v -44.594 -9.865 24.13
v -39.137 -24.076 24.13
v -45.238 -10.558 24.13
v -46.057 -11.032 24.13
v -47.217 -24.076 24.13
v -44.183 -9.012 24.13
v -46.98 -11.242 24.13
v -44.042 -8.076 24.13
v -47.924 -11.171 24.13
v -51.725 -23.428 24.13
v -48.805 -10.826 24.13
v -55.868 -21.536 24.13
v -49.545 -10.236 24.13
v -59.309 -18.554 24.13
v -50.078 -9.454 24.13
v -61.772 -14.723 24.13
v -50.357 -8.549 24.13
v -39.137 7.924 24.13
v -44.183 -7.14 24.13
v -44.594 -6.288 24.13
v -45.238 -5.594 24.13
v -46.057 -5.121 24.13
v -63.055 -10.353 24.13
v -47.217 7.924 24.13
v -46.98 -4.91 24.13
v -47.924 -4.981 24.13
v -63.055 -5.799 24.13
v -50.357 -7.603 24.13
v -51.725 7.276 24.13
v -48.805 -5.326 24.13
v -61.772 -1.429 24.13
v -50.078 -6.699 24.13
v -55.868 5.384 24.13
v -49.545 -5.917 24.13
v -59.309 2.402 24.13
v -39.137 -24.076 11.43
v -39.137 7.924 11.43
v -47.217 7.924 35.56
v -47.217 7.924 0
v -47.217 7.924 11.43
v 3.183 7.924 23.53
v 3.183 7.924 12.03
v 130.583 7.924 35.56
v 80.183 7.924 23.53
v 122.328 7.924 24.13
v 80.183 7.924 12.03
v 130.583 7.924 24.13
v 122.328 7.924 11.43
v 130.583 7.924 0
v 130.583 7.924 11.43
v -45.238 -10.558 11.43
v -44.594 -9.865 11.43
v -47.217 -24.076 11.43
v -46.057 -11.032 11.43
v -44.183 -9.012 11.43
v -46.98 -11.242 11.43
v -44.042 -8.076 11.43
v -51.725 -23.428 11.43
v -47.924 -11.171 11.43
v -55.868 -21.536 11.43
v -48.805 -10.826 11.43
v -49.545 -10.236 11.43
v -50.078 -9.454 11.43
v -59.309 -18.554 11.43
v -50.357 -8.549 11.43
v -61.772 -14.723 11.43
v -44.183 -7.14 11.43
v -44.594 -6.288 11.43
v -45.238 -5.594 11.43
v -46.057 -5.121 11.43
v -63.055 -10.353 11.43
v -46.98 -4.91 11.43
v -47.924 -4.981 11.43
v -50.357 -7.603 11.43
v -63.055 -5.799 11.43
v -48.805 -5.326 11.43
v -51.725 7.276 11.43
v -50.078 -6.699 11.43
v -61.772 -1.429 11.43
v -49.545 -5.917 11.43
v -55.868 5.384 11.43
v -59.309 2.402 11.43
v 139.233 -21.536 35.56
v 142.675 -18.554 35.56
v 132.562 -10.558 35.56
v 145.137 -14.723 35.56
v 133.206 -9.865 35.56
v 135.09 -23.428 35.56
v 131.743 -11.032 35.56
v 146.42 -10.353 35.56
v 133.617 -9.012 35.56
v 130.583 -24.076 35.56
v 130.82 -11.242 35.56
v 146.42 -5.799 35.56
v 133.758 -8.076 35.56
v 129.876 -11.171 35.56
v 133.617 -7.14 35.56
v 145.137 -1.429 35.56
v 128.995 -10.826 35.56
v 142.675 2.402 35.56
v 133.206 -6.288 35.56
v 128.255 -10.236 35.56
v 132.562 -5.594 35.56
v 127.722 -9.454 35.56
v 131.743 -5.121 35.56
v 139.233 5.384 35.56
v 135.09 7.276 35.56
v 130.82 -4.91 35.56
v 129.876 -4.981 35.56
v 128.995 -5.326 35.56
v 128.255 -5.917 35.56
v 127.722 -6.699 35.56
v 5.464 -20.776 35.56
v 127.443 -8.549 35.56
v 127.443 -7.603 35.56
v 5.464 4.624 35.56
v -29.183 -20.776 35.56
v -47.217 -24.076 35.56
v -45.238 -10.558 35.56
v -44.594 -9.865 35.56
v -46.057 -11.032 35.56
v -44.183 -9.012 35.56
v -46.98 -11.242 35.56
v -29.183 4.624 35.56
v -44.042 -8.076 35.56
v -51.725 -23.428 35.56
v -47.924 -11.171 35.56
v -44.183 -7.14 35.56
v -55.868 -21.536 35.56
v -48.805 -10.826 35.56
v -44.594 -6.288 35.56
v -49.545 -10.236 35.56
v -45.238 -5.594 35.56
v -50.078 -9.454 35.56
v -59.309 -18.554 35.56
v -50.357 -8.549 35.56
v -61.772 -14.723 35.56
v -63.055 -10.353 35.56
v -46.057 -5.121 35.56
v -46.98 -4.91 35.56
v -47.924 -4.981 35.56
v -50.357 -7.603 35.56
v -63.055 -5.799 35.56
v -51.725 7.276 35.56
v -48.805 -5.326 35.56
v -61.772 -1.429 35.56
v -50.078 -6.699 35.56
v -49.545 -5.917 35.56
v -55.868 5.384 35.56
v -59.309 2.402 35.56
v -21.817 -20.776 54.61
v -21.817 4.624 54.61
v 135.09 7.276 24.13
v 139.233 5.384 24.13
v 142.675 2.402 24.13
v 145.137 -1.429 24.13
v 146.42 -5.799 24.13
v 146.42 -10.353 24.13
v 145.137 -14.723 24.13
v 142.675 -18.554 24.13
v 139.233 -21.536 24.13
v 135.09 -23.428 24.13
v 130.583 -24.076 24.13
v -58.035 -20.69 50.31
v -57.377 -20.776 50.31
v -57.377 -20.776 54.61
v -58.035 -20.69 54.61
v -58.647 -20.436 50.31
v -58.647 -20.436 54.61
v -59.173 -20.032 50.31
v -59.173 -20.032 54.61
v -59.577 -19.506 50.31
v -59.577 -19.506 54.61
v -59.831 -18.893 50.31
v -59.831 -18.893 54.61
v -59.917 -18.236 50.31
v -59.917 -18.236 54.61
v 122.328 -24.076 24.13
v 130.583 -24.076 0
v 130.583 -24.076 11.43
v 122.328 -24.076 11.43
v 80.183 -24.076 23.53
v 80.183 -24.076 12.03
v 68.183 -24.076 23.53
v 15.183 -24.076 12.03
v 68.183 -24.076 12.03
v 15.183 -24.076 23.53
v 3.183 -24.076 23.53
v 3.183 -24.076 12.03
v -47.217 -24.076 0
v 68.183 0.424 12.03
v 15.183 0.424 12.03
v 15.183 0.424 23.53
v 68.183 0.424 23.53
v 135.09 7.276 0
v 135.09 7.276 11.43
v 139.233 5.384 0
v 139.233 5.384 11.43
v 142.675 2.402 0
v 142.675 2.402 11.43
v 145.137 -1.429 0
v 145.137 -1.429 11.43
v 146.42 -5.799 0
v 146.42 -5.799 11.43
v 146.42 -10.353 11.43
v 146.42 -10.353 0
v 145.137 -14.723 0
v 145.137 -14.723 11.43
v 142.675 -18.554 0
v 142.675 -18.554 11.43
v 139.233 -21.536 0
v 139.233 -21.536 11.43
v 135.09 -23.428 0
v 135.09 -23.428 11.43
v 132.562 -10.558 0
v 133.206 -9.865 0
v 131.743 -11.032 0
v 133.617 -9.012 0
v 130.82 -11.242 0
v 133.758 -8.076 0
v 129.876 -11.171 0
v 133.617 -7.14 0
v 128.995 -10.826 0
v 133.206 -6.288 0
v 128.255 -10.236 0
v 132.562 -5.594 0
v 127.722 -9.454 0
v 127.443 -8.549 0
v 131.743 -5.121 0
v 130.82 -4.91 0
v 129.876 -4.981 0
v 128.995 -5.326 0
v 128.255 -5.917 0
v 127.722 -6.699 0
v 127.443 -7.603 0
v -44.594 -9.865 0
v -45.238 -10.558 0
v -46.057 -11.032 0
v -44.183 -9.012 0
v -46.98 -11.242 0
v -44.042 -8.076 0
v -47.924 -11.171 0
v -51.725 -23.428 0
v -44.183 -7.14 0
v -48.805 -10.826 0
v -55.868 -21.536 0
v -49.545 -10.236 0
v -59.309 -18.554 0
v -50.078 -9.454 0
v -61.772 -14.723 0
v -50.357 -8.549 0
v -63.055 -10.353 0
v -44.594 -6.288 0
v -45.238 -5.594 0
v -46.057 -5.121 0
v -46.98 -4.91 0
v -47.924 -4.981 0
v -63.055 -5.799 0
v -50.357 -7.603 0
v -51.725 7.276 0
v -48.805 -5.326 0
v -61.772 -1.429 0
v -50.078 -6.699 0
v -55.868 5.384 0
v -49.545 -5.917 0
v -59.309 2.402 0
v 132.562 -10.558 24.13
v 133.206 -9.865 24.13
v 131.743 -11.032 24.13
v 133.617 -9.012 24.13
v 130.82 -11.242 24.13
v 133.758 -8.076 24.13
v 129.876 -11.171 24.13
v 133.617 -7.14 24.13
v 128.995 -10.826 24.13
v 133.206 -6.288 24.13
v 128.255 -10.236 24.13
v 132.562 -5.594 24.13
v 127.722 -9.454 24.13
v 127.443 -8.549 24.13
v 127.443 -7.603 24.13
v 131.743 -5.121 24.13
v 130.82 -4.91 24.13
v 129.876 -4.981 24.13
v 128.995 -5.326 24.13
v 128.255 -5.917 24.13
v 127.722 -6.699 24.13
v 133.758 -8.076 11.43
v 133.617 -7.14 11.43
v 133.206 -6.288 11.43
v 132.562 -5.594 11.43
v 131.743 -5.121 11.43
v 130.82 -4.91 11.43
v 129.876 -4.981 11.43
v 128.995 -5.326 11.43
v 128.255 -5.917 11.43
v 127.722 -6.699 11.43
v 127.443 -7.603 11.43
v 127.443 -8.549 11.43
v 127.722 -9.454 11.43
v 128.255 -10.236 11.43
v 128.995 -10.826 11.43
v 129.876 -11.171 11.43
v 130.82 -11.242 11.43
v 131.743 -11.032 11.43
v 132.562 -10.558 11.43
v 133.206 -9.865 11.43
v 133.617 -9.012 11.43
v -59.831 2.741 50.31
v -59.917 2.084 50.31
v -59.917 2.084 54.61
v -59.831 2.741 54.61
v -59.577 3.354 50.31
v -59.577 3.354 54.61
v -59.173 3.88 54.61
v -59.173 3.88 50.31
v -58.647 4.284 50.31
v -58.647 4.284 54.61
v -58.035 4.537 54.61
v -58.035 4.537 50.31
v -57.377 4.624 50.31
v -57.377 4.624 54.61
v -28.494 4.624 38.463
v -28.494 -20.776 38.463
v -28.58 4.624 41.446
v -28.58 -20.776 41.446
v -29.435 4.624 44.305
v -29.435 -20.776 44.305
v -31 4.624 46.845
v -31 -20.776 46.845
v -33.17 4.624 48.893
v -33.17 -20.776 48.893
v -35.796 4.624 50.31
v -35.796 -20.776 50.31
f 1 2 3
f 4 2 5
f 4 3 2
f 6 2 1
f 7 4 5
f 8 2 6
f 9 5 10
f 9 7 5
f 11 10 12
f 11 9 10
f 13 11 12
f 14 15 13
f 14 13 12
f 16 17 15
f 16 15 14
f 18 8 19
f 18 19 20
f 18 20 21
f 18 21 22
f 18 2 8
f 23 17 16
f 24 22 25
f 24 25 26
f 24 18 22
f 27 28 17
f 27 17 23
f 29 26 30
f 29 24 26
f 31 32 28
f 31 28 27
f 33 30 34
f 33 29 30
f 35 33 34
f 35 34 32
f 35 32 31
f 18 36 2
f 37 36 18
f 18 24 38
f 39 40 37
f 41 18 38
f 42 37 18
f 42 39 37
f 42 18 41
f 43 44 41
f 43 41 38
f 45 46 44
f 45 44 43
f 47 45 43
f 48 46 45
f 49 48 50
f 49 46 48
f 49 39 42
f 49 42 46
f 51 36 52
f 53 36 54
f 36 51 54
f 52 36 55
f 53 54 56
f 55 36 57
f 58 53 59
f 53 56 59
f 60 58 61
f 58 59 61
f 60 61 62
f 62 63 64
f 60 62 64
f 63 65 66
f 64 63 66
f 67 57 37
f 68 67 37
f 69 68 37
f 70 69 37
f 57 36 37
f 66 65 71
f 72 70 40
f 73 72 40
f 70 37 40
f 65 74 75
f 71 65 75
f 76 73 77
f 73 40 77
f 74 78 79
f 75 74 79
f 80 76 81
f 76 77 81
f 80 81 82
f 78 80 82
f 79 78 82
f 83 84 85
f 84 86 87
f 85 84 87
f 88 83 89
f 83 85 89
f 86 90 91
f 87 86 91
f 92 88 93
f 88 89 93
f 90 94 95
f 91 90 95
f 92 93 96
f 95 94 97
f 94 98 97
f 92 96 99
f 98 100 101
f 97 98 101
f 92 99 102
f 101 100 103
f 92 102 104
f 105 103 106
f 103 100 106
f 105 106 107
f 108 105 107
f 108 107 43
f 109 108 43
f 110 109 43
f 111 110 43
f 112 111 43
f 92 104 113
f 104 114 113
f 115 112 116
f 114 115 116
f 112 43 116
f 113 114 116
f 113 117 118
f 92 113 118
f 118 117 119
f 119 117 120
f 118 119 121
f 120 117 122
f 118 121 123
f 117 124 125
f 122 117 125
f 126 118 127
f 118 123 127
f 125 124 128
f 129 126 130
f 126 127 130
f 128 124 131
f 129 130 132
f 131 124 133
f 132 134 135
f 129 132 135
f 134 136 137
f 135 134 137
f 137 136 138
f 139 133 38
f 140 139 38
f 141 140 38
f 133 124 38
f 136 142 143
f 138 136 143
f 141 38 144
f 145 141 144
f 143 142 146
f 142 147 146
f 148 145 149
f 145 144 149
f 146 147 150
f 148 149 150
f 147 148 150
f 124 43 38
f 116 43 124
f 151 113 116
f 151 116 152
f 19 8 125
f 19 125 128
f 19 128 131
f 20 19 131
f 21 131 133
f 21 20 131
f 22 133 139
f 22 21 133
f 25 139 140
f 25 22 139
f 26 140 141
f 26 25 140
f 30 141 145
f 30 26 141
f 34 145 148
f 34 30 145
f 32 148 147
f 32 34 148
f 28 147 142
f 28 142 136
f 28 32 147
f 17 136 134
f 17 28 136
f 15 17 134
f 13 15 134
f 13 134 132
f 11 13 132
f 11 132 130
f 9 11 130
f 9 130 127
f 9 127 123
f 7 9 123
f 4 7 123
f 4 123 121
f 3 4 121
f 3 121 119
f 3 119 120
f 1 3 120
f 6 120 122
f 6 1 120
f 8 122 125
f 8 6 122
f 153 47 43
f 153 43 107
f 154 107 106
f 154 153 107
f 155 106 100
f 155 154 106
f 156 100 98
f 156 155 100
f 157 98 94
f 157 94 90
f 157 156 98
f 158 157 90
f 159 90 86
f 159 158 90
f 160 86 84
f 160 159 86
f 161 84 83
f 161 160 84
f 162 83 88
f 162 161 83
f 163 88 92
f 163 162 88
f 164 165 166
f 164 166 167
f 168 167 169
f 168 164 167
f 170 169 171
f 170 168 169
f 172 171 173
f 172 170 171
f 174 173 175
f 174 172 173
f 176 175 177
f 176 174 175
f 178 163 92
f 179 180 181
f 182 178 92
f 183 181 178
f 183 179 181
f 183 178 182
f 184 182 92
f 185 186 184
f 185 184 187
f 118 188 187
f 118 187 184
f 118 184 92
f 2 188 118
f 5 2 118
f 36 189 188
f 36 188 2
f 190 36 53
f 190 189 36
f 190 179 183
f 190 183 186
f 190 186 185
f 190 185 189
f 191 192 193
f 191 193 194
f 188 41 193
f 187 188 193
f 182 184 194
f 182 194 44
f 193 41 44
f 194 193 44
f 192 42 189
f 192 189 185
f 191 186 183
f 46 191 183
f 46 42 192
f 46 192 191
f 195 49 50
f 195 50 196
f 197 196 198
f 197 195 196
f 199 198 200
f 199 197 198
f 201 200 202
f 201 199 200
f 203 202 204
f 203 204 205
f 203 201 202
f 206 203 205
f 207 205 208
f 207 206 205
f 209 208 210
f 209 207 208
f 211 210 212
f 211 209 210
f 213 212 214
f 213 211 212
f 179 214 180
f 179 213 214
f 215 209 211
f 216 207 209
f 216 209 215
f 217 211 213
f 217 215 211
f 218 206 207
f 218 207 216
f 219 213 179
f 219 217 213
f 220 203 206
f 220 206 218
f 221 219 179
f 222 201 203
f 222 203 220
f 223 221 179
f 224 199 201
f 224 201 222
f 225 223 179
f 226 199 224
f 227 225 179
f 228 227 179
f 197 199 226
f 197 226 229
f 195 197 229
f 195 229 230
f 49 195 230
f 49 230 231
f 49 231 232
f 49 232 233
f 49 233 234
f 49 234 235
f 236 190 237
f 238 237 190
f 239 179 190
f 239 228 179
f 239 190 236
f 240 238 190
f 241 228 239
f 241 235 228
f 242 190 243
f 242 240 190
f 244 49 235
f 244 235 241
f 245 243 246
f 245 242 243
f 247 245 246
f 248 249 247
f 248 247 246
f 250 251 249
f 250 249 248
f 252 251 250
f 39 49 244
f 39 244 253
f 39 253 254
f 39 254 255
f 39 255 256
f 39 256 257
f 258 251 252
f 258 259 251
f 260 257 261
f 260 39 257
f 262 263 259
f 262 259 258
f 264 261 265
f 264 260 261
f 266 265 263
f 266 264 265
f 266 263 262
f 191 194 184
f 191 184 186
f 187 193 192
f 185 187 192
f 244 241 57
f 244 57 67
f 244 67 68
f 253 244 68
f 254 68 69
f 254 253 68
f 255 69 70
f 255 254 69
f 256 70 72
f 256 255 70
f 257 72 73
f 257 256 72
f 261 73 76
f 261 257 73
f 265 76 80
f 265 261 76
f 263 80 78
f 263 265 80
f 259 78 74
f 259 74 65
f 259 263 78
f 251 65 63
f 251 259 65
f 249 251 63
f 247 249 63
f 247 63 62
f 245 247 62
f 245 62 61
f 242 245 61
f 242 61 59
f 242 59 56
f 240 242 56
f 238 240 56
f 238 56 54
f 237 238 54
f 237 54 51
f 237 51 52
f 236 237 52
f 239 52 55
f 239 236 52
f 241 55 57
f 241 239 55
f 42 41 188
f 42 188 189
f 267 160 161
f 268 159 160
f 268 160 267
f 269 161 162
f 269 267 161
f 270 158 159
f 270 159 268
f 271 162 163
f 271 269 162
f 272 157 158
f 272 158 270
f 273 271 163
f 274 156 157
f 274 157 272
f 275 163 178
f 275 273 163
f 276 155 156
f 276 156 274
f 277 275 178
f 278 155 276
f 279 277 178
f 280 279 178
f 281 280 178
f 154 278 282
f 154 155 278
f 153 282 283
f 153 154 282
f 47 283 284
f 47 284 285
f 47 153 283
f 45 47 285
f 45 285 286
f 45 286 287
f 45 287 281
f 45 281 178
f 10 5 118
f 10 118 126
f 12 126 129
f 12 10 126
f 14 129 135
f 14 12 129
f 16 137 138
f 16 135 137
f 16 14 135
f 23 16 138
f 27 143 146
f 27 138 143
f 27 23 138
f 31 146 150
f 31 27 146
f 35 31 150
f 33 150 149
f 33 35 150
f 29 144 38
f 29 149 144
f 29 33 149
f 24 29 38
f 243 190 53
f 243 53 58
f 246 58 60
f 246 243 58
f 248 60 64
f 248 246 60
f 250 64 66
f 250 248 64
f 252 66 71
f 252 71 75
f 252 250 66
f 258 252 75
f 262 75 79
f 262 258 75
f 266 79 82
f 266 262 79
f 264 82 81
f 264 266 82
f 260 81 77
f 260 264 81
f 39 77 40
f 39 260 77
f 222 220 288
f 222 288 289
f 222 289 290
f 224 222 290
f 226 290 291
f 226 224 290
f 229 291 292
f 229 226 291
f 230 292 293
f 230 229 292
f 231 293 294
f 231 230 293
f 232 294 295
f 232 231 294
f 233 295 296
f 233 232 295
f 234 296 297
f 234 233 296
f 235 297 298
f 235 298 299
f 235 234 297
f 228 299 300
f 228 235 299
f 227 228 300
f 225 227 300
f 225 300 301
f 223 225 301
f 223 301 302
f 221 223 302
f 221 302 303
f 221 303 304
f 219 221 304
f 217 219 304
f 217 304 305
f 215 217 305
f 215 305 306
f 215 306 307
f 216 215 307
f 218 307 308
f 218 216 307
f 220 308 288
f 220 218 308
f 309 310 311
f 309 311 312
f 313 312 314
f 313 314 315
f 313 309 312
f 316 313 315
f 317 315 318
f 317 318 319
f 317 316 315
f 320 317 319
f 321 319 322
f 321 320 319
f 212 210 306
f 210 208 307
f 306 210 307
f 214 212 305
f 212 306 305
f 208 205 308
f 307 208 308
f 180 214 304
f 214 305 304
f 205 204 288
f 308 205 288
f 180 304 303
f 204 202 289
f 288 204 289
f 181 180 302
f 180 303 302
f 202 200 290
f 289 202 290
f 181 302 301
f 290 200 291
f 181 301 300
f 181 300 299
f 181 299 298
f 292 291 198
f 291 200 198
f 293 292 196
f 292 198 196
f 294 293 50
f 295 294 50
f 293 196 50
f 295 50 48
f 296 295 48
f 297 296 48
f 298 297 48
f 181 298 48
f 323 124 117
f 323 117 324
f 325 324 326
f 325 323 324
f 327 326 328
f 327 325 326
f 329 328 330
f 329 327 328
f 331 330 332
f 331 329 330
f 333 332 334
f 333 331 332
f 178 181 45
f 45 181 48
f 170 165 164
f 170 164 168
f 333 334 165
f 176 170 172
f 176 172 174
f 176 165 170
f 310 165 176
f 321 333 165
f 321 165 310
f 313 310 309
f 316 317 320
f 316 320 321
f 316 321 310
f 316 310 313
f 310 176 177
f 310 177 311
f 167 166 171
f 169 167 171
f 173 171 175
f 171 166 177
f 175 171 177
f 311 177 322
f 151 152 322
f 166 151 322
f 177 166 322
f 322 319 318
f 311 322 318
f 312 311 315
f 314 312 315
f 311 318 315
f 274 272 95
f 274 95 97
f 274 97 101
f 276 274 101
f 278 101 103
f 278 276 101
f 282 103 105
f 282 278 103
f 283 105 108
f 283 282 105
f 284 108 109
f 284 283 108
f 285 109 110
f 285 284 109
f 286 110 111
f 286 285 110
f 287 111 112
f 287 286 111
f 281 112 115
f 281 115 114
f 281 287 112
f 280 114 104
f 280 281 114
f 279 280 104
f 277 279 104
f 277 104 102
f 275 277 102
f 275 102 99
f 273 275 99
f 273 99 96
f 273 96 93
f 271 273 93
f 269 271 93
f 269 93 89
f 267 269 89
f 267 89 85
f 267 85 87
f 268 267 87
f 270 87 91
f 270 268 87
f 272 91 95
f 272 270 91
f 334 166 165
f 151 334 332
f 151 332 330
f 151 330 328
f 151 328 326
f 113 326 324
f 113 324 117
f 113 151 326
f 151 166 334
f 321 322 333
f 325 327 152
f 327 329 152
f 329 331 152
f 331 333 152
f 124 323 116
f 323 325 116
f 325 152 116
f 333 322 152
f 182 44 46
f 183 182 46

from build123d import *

# Parameters (mm, degrees)
SKETCH1_R           = 3.175
BOSS_EXTRUDE1_DEPTH = 11.43
SKETCH2_W           = 161.464261653
SKETCH2_H           = 32
BOSS_EXTRUDE2_DEPTH = 12.7
SKETCH5_R           = 3.175
BOSS_EXTRUDE3_DEPTH = 11.43
SKETCH6_W           = 77
SKETCH6_H           = 11.5
CUT_EXTRUDE1_DEPTH  = 7.5
BOSS_EXTRUDE4_DEPTH = 19.05
CUT_EXTRUDE3_DEPTH  = 30.48
BOSS_EXTRUDE5_DEPTH = 25.4
SKETCH7_W           = 12
SKETCH7_H           = 11.5
CUT_EXTRUDE4_DEPTH  = 50.8
SKETCH7_5_W         = 12
SKETCH7_5_H         = 11.5
CUT_EXTRUDE5_DEPTH  = 50.8


with BuildPart() as part:
    # Sketch1 → Boss-Extrude1 (new body)
    with BuildSketch(Plane.XY):
        with BuildLine():
            Line((-47.217391304, 7.923913043), (130.582608696, 7.923913043))
            ThreePointArc((130.582608696, 7.923913043), (146.582608696, -8.076086957), (130.582608696, -24.076086957))
            Line((130.582608696, -24.076086957), (-47.217391304, -24.076086957))
            ThreePointArc((-47.217391304, -24.076086957), (-63.217391304, -8.076086957), (-47.217391304, 7.923913043))
        make_face()
        with Locations((-47.217391304, -8.076086957)):
            Circle(SKETCH1_R, mode=Mode.SUBTRACT)
        with Locations((130.582608696, -8.076086957)):
            Circle(SKETCH1_R, mode=Mode.SUBTRACT)
    extrude(amount=BOSS_EXTRUDE1_DEPTH)

    # Sketch2 → Boss-Extrude2 (add)
    with BuildSketch(Plane.XY.offset(11.43)):
        with Locations((41.59547787, -8.076086957)):
            Rectangle(SKETCH2_W, SKETCH2_H)
    extrude(amount=BOSS_EXTRUDE2_DEPTH)

    # Sketch5 → Boss-Extrude3 (add)
    with BuildSketch(Plane.XY.offset(24.13)):
        with BuildLine():
            Line((-47.217391304, 7.923913043), (130.582608696, 7.923913043))
            ThreePointArc((130.582608696, 7.923913043), (146.582608696, -8.076086957), (130.582608696, -24.076086957))
            Line((130.582608696, -24.076086957), (-47.217391304, -24.076086957))
            ThreePointArc((-47.217391304, -24.076086957), (-63.217391304, -8.076086957), (-47.217391304, 7.923913043))
        make_face()
        with Locations((-47.217391304, -8.076086957)):
            Circle(SKETCH5_R, mode=Mode.SUBTRACT)
        with Locations((130.582608696, -8.076086957)):
            Circle(SKETCH5_R, mode=Mode.SUBTRACT)
    extrude(amount=BOSS_EXTRUDE3_DEPTH)

    # Sketch6 → Cut-Extrude1 (cut)
    with BuildSketch(Plane(origin=(0, 7.923913043, 0), x_dir=(1, 0, 0), z_dir=(0, 1, 0))):
        with Locations((41.682608696, -17.78)):
            Rectangle(SKETCH6_W, SKETCH6_H)
    extrude(amount=-CUT_EXTRUDE1_DEPTH, mode=Mode.SUBTRACT)

    # Sketch10 → Boss-Extrude4 (add)
    with BuildSketch(Plane.XY.offset(35.56)):
        with BuildLine():
            Line((-34.517391304, -20.776086957), (-57.377391304, -20.776086957))
            ThreePointArc((-57.377391304, -20.776086957), (-59.173442529, -20.032138181), (-59.917391304, -18.236086957))
            Line((-59.917391304, -18.236086957), (-59.917391304, 2.083913043))
            ThreePointArc((-59.917391304, 2.083913043), (-59.173442529, 3.879964268), (-57.377391304, 4.623913043))
            Line((-57.377391304, 4.623913043), (-34.517391304, 4.623913043))
            Line((-34.517391304, 4.623913043), (-21.817391304, 4.623913043))
            Line((-21.817391304, 4.623913043), (-21.817391304, -20.776086957))
            Line((-21.817391304, -20.776086957), (-34.517391304, -20.776086957))
        make_face()
    extrude(amount=BOSS_EXTRUDE4_DEPTH)

    # Sketch14 → Cut-Extrude3 (cut)
    with BuildSketch(Plane(origin=(0, 4.623913043, 0), x_dir=(1, 0, 0), z_dir=(0, 1, 0))):
        with BuildLine():
            Line((-59.917391304, -35.56), (-29.183391304, -35.56))
            ThreePointArc((-29.183391304, -35.56), (-29.434604535, -44.304535578), (-35.79555952, -50.310221405))
            Line((-35.79555952, -50.310221405), (-59.917391304, -50.310221405))
            Line((-59.917391304, -50.310221405), (-59.917391304, -35.56))
        make_face()
    extrude(amount=-CUT_EXTRUDE3_DEPTH, mode=Mode.SUBTRACT)

    # Sketch15 → Boss-Extrude5 (add)
    with BuildSketch(Plane.XZ.offset(20.776086957)):
        Polygon((-21.817391304, 35.56), (5.46367495, 35.56), (-21.817391304, 54.61), align=None)
    extrude(amount=-BOSS_EXTRUDE5_DEPTH)

    # Sketch7 → Cut-Extrude4 (cut)
    with BuildSketch(Plane(origin=(0, 0.423913043, 0), x_dir=(1, 0, 0), z_dir=(0, 1, 0))):
        with Locations((74.182608696, -17.78)):
            Rectangle(SKETCH7_W, SKETCH7_H)
    extrude(amount=-CUT_EXTRUDE4_DEPTH, mode=Mode.SUBTRACT)

    # Sketch7<5> → Cut-Extrude5 (cut)
    with BuildSketch(Plane(origin=(0, 0.423913043, 0), x_dir=(1, 0, 0), z_dir=(0, 1, 0))):
        with Locations((9.182608696, -17.78)):
            Rectangle(SKETCH7_5_W, SKETCH7_5_H)
    extrude(amount=-CUT_EXTRUDE5_DEPTH, mode=Mode.SUBTRACT)


solid = part.part
